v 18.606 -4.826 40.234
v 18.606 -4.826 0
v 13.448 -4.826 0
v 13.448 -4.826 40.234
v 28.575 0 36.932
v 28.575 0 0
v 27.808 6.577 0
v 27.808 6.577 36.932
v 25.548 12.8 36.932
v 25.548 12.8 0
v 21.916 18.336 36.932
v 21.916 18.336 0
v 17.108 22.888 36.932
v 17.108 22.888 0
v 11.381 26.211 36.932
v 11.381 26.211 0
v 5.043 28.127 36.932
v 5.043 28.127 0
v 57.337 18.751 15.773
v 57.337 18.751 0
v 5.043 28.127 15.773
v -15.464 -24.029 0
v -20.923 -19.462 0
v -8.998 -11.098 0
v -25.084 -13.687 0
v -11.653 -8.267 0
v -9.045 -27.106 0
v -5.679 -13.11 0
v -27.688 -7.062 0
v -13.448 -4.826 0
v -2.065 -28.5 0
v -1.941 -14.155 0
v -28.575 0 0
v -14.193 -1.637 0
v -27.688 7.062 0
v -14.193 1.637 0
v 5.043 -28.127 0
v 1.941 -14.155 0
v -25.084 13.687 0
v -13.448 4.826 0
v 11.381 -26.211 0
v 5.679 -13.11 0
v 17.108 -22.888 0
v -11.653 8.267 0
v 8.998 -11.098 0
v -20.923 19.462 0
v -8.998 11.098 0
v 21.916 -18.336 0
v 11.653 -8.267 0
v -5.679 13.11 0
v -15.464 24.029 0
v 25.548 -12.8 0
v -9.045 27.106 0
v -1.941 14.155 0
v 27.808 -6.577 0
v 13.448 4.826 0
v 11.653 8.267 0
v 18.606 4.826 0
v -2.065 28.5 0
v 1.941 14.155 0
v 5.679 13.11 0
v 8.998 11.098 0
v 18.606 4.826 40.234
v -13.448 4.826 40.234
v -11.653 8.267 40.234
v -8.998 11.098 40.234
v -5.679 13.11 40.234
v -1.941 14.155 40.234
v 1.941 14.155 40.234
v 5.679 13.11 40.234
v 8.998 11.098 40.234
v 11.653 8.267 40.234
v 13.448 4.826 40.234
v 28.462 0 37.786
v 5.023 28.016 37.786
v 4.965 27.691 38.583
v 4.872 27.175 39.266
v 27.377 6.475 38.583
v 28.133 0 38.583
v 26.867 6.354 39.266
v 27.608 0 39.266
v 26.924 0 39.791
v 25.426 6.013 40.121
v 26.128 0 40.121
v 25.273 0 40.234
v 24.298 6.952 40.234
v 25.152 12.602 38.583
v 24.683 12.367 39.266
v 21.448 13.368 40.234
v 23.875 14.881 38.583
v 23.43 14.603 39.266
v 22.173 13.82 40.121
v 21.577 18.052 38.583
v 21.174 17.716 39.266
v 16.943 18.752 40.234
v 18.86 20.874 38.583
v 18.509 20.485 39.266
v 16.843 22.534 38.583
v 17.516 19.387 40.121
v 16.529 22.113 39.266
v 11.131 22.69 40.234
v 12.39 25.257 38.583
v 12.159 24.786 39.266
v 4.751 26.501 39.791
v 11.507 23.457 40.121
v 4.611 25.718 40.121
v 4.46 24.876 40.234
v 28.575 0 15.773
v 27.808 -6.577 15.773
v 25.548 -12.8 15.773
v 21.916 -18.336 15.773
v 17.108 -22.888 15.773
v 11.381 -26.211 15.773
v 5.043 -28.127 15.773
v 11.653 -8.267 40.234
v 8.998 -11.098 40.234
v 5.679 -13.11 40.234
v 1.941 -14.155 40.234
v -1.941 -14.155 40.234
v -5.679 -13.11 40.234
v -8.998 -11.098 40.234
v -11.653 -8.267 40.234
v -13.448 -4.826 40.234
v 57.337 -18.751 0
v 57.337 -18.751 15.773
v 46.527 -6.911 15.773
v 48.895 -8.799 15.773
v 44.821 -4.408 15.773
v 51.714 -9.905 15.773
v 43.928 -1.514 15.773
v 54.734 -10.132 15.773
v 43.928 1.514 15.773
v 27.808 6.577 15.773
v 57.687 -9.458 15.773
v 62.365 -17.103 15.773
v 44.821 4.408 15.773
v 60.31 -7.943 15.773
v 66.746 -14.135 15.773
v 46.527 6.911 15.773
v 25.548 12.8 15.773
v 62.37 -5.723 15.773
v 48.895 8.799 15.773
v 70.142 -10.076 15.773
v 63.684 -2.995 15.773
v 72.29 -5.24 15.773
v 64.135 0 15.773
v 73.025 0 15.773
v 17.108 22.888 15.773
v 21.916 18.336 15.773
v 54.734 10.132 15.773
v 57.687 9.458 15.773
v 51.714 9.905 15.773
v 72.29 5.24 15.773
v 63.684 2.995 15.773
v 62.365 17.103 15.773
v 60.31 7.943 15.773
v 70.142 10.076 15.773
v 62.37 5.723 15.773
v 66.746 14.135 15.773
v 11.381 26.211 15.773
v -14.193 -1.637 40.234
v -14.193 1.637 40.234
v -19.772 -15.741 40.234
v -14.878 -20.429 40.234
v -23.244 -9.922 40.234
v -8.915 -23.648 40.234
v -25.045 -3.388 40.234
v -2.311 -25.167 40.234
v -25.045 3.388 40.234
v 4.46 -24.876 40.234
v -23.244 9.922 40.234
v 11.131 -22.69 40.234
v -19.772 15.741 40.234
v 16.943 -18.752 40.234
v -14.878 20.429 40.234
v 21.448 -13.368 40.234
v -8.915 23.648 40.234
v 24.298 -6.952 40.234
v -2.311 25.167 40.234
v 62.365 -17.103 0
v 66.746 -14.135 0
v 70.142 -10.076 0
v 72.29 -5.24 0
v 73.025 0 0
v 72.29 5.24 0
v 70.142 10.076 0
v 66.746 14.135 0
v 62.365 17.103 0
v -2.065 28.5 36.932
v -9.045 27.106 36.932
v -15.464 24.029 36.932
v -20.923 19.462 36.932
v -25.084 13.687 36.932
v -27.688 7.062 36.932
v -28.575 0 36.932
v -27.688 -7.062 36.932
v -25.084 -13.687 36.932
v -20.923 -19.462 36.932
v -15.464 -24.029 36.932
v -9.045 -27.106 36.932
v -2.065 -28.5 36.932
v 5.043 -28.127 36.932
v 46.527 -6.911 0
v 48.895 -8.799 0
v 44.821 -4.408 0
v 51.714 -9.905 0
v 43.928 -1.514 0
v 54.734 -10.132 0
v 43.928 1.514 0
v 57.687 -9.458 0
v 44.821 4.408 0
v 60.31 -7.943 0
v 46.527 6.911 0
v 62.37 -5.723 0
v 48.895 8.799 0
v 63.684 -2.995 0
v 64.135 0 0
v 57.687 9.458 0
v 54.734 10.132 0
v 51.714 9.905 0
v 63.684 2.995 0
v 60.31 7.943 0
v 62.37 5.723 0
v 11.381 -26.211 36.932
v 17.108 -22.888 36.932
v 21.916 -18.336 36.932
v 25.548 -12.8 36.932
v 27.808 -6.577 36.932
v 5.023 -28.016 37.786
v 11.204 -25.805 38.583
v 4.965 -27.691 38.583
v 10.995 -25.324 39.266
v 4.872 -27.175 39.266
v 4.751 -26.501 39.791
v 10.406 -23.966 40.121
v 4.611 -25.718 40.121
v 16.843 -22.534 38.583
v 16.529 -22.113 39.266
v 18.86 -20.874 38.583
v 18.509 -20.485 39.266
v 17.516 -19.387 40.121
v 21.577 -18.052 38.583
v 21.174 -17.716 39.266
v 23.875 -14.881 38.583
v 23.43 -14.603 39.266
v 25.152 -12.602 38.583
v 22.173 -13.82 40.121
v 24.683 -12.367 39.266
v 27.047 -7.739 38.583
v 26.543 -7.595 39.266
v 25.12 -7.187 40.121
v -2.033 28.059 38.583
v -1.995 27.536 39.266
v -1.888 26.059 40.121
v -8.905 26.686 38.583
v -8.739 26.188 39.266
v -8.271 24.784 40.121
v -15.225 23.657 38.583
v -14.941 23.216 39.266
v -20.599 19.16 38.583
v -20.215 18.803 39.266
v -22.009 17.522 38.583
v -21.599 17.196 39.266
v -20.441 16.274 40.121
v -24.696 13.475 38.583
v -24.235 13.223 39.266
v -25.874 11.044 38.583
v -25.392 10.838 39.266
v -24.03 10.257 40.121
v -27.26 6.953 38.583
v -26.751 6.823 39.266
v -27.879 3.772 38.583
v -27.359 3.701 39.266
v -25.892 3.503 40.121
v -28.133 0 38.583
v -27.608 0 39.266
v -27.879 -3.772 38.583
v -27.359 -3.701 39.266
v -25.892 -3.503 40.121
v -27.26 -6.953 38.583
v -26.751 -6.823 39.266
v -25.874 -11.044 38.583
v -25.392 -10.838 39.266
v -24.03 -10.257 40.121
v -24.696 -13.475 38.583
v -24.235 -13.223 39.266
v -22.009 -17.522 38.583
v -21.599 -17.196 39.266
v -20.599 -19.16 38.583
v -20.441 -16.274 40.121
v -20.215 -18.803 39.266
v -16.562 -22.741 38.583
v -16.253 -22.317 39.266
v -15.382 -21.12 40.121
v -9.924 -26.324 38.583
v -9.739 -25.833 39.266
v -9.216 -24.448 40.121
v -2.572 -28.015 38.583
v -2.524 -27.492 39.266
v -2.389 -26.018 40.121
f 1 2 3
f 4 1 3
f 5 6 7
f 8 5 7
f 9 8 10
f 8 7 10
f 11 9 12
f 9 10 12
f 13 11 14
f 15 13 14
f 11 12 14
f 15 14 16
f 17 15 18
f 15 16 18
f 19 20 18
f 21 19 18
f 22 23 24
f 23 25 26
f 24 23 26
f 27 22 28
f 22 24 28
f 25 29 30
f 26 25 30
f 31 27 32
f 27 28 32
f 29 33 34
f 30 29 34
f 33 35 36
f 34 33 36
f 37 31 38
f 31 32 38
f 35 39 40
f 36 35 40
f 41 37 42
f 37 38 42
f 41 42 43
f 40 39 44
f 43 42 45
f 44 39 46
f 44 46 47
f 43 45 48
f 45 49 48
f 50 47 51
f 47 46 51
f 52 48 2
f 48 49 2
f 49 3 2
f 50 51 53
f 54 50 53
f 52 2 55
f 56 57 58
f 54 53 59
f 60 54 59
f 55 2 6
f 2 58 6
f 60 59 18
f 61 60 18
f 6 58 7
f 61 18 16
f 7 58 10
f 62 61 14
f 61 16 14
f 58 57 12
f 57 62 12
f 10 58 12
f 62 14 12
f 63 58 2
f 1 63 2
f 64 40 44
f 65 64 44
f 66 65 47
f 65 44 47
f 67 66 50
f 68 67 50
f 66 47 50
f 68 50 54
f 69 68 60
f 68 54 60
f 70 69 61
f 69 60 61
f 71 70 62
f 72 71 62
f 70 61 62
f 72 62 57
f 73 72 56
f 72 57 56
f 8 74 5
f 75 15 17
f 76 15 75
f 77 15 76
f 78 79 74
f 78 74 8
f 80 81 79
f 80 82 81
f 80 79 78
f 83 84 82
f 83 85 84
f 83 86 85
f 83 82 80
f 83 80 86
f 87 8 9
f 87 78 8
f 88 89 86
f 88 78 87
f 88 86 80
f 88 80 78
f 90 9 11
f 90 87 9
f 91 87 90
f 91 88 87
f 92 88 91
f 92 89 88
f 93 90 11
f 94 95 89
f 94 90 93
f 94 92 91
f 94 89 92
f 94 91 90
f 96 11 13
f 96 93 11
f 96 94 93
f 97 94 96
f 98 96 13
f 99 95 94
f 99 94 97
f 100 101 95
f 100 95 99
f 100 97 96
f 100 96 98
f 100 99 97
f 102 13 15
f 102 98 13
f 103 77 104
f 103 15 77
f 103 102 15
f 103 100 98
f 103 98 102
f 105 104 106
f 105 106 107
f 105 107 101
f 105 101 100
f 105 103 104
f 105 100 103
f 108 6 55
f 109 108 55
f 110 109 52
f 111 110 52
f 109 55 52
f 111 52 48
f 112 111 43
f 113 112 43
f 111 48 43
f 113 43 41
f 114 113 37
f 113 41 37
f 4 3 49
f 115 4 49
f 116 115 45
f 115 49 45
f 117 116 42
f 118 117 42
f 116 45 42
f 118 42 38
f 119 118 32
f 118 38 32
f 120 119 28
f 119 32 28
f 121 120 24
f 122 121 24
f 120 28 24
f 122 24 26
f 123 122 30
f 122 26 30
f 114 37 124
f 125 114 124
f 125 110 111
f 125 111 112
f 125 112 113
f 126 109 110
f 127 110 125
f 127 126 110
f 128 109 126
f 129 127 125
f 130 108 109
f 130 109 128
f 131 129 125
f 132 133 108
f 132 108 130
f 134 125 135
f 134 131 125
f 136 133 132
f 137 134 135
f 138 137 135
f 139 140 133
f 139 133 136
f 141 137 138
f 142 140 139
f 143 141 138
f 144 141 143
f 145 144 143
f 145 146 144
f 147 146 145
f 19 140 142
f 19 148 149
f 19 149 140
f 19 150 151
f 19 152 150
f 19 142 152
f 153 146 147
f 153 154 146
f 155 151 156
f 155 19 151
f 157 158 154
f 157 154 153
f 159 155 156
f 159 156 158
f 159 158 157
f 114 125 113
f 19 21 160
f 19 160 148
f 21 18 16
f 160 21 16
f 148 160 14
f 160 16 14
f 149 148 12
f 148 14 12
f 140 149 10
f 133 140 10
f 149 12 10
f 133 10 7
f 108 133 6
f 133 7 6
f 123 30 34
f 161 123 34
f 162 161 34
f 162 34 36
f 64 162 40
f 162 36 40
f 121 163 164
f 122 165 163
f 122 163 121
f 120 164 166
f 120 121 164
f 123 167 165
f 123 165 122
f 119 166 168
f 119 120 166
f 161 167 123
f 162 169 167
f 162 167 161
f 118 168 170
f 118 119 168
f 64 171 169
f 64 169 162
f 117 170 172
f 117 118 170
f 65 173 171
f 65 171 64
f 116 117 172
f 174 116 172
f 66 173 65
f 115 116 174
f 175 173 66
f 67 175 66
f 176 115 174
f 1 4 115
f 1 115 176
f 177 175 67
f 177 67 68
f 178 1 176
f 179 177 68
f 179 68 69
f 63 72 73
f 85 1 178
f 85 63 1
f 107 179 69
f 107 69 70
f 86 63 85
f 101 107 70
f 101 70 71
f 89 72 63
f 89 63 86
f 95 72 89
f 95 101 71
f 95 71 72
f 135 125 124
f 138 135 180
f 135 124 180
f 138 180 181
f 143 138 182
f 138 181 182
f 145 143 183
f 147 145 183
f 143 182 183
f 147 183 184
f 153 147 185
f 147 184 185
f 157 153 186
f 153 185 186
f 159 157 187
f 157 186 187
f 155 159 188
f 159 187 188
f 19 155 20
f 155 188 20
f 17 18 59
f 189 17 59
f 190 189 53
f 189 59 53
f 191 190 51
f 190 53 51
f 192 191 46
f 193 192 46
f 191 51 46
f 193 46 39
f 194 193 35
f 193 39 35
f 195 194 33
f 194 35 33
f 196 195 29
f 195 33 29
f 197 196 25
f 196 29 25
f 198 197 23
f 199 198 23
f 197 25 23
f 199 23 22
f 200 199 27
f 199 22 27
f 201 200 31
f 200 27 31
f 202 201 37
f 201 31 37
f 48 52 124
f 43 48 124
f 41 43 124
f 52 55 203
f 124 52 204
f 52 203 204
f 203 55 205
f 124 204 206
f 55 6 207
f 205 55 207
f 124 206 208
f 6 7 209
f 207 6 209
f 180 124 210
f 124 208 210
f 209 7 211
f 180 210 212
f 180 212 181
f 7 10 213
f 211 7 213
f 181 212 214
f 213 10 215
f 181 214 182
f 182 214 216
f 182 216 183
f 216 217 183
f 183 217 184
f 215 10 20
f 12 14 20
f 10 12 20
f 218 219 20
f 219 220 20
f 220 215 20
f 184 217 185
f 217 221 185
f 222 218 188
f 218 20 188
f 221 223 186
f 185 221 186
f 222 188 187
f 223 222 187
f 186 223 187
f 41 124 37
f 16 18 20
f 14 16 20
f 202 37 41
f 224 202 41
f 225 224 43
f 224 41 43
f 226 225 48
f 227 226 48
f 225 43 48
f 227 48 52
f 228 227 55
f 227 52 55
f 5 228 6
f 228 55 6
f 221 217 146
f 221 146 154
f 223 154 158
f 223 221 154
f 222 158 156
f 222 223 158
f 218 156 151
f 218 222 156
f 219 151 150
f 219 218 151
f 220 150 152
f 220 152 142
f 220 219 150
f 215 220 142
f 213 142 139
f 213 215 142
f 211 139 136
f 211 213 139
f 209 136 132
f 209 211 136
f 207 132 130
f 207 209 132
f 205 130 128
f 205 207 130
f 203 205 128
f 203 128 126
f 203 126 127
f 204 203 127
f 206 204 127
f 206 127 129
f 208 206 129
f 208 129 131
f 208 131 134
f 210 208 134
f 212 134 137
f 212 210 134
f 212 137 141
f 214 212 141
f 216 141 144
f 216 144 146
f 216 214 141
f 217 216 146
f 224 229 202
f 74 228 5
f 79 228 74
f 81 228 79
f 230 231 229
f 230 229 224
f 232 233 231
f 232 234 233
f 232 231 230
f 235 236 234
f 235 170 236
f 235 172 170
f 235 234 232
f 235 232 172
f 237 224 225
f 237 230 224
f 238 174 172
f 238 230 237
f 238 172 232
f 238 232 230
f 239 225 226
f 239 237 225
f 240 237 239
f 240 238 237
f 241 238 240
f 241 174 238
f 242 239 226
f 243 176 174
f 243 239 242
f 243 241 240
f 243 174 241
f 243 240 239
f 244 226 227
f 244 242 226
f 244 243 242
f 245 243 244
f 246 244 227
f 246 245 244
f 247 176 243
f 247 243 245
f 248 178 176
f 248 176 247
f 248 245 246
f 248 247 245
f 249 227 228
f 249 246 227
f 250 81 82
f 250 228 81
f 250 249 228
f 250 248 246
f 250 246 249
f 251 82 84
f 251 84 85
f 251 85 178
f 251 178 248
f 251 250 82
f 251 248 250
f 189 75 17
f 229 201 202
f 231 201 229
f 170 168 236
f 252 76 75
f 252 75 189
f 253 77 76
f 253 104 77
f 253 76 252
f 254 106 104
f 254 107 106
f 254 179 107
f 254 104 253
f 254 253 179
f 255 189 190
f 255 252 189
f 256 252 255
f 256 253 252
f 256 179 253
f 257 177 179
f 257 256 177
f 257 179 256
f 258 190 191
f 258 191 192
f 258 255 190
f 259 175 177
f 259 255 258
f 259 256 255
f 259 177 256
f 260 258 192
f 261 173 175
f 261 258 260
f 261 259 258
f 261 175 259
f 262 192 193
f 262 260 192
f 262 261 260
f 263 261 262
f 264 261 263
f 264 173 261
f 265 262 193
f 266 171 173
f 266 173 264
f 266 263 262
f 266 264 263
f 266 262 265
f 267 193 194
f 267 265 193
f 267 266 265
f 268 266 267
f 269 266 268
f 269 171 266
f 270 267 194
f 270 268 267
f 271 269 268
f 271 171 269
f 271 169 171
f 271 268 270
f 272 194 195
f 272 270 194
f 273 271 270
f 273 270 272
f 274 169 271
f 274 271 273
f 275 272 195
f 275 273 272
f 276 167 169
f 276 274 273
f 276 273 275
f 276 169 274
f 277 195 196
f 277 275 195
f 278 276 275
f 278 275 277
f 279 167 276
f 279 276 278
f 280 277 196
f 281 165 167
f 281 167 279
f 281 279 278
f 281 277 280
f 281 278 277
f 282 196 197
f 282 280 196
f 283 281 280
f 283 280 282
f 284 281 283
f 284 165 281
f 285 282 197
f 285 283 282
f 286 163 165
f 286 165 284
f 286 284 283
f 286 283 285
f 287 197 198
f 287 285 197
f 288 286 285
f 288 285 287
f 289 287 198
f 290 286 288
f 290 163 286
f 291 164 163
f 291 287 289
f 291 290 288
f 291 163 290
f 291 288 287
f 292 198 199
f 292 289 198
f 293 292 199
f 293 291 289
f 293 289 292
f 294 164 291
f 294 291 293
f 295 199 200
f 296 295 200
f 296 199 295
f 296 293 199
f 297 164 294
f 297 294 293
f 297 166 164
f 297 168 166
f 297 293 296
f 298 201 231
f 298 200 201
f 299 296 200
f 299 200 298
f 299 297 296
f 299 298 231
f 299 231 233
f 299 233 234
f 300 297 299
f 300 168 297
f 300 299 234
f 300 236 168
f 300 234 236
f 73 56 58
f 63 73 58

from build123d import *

# Parameters (mm, degrees)
F1_DEPTH = 40.2336
F0_R     = 10.16
F2_DEPTH = 15.7734
F3_R     = 3.302


with BuildPart() as f1:
    # F0 (on Top) → F1 (new body)
    with BuildSketch(Plane.XY):
        with BuildLine():
            ThreePointArc((5.042647, -28.126541), (21.916025, -18.336262), (28.575, 0))
            ThreePointArc((28.575, 0), (21.916025, 18.336262), (5.042647, 28.126541))
            ThreePointArc((5.042647, 28.126541), (-28.575, 0), (5.042647, -28.126541))
        make_face()
        with BuildLine():
            ThreePointArc((-13.447765, 4.826), (0, 14.2875), (13.447765, 4.826))
            Line((13.447765, 4.826), (18.6055, 4.826))
            Line((18.6055, 4.826), (18.6055, -4.826))
            Line((18.6055, -4.826), (13.447765, -4.826))
            ThreePointArc((13.447765, -4.826), (0, -14.2875), (-13.447765, -4.826))
            Line((-13.447765, -4.826), (-18.6055, -4.826))
            Line((-18.6055, -4.826), (-18.6055, 4.826))
            Line((-18.6055, 4.826), (-13.447765, 4.826))
        make_face(mode=Mode.SUBTRACT)
        with BuildLine():
            ThreePointArc((-13.447765, -4.826), (-14.2875, 0), (-13.447765, 4.826))
            Line((-13.447765, 4.826), (-18.6055, 4.826))
            Line((-18.6055, 4.826), (-18.6055, -4.826))
            Line((-18.6055, -4.826), (-13.447765, -4.826))
        make_face()
    extrude(amount=F1_DEPTH)

    # F3
    f3_edges = [f1.edges().sort_by_distance(p)[0] for p in [
        (-5.042647, 28.126541, 40.2336),
    ]]
    fillet(f3_edges, radius=F3_R)


with BuildPart() as f2:
    # F0 (on Top) → F2 (new body)
    with BuildSketch(Plane.XY):
        with BuildLine():
            ThreePointArc((5.042647, 28.126541), (21.916025, 18.336262), (28.575, 0))
            ThreePointArc((28.575, 0), (21.916025, -18.336262), (5.042647, -28.126541))
            Line((5.042647, -28.126541), (57.336765, -18.751028))
            ThreePointArc((57.336765, -18.751028), (73.025, 0), (57.336765, 18.751028))
            Line((57.336765, 18.751028), (5.042647, 28.126541))
        make_face()
        with Locations((53.975, 0)):
            Circle(F0_R, mode=Mode.SUBTRACT)
    extrude(amount=F2_DEPTH)


solid = Compound([f1.part, f2.part])
